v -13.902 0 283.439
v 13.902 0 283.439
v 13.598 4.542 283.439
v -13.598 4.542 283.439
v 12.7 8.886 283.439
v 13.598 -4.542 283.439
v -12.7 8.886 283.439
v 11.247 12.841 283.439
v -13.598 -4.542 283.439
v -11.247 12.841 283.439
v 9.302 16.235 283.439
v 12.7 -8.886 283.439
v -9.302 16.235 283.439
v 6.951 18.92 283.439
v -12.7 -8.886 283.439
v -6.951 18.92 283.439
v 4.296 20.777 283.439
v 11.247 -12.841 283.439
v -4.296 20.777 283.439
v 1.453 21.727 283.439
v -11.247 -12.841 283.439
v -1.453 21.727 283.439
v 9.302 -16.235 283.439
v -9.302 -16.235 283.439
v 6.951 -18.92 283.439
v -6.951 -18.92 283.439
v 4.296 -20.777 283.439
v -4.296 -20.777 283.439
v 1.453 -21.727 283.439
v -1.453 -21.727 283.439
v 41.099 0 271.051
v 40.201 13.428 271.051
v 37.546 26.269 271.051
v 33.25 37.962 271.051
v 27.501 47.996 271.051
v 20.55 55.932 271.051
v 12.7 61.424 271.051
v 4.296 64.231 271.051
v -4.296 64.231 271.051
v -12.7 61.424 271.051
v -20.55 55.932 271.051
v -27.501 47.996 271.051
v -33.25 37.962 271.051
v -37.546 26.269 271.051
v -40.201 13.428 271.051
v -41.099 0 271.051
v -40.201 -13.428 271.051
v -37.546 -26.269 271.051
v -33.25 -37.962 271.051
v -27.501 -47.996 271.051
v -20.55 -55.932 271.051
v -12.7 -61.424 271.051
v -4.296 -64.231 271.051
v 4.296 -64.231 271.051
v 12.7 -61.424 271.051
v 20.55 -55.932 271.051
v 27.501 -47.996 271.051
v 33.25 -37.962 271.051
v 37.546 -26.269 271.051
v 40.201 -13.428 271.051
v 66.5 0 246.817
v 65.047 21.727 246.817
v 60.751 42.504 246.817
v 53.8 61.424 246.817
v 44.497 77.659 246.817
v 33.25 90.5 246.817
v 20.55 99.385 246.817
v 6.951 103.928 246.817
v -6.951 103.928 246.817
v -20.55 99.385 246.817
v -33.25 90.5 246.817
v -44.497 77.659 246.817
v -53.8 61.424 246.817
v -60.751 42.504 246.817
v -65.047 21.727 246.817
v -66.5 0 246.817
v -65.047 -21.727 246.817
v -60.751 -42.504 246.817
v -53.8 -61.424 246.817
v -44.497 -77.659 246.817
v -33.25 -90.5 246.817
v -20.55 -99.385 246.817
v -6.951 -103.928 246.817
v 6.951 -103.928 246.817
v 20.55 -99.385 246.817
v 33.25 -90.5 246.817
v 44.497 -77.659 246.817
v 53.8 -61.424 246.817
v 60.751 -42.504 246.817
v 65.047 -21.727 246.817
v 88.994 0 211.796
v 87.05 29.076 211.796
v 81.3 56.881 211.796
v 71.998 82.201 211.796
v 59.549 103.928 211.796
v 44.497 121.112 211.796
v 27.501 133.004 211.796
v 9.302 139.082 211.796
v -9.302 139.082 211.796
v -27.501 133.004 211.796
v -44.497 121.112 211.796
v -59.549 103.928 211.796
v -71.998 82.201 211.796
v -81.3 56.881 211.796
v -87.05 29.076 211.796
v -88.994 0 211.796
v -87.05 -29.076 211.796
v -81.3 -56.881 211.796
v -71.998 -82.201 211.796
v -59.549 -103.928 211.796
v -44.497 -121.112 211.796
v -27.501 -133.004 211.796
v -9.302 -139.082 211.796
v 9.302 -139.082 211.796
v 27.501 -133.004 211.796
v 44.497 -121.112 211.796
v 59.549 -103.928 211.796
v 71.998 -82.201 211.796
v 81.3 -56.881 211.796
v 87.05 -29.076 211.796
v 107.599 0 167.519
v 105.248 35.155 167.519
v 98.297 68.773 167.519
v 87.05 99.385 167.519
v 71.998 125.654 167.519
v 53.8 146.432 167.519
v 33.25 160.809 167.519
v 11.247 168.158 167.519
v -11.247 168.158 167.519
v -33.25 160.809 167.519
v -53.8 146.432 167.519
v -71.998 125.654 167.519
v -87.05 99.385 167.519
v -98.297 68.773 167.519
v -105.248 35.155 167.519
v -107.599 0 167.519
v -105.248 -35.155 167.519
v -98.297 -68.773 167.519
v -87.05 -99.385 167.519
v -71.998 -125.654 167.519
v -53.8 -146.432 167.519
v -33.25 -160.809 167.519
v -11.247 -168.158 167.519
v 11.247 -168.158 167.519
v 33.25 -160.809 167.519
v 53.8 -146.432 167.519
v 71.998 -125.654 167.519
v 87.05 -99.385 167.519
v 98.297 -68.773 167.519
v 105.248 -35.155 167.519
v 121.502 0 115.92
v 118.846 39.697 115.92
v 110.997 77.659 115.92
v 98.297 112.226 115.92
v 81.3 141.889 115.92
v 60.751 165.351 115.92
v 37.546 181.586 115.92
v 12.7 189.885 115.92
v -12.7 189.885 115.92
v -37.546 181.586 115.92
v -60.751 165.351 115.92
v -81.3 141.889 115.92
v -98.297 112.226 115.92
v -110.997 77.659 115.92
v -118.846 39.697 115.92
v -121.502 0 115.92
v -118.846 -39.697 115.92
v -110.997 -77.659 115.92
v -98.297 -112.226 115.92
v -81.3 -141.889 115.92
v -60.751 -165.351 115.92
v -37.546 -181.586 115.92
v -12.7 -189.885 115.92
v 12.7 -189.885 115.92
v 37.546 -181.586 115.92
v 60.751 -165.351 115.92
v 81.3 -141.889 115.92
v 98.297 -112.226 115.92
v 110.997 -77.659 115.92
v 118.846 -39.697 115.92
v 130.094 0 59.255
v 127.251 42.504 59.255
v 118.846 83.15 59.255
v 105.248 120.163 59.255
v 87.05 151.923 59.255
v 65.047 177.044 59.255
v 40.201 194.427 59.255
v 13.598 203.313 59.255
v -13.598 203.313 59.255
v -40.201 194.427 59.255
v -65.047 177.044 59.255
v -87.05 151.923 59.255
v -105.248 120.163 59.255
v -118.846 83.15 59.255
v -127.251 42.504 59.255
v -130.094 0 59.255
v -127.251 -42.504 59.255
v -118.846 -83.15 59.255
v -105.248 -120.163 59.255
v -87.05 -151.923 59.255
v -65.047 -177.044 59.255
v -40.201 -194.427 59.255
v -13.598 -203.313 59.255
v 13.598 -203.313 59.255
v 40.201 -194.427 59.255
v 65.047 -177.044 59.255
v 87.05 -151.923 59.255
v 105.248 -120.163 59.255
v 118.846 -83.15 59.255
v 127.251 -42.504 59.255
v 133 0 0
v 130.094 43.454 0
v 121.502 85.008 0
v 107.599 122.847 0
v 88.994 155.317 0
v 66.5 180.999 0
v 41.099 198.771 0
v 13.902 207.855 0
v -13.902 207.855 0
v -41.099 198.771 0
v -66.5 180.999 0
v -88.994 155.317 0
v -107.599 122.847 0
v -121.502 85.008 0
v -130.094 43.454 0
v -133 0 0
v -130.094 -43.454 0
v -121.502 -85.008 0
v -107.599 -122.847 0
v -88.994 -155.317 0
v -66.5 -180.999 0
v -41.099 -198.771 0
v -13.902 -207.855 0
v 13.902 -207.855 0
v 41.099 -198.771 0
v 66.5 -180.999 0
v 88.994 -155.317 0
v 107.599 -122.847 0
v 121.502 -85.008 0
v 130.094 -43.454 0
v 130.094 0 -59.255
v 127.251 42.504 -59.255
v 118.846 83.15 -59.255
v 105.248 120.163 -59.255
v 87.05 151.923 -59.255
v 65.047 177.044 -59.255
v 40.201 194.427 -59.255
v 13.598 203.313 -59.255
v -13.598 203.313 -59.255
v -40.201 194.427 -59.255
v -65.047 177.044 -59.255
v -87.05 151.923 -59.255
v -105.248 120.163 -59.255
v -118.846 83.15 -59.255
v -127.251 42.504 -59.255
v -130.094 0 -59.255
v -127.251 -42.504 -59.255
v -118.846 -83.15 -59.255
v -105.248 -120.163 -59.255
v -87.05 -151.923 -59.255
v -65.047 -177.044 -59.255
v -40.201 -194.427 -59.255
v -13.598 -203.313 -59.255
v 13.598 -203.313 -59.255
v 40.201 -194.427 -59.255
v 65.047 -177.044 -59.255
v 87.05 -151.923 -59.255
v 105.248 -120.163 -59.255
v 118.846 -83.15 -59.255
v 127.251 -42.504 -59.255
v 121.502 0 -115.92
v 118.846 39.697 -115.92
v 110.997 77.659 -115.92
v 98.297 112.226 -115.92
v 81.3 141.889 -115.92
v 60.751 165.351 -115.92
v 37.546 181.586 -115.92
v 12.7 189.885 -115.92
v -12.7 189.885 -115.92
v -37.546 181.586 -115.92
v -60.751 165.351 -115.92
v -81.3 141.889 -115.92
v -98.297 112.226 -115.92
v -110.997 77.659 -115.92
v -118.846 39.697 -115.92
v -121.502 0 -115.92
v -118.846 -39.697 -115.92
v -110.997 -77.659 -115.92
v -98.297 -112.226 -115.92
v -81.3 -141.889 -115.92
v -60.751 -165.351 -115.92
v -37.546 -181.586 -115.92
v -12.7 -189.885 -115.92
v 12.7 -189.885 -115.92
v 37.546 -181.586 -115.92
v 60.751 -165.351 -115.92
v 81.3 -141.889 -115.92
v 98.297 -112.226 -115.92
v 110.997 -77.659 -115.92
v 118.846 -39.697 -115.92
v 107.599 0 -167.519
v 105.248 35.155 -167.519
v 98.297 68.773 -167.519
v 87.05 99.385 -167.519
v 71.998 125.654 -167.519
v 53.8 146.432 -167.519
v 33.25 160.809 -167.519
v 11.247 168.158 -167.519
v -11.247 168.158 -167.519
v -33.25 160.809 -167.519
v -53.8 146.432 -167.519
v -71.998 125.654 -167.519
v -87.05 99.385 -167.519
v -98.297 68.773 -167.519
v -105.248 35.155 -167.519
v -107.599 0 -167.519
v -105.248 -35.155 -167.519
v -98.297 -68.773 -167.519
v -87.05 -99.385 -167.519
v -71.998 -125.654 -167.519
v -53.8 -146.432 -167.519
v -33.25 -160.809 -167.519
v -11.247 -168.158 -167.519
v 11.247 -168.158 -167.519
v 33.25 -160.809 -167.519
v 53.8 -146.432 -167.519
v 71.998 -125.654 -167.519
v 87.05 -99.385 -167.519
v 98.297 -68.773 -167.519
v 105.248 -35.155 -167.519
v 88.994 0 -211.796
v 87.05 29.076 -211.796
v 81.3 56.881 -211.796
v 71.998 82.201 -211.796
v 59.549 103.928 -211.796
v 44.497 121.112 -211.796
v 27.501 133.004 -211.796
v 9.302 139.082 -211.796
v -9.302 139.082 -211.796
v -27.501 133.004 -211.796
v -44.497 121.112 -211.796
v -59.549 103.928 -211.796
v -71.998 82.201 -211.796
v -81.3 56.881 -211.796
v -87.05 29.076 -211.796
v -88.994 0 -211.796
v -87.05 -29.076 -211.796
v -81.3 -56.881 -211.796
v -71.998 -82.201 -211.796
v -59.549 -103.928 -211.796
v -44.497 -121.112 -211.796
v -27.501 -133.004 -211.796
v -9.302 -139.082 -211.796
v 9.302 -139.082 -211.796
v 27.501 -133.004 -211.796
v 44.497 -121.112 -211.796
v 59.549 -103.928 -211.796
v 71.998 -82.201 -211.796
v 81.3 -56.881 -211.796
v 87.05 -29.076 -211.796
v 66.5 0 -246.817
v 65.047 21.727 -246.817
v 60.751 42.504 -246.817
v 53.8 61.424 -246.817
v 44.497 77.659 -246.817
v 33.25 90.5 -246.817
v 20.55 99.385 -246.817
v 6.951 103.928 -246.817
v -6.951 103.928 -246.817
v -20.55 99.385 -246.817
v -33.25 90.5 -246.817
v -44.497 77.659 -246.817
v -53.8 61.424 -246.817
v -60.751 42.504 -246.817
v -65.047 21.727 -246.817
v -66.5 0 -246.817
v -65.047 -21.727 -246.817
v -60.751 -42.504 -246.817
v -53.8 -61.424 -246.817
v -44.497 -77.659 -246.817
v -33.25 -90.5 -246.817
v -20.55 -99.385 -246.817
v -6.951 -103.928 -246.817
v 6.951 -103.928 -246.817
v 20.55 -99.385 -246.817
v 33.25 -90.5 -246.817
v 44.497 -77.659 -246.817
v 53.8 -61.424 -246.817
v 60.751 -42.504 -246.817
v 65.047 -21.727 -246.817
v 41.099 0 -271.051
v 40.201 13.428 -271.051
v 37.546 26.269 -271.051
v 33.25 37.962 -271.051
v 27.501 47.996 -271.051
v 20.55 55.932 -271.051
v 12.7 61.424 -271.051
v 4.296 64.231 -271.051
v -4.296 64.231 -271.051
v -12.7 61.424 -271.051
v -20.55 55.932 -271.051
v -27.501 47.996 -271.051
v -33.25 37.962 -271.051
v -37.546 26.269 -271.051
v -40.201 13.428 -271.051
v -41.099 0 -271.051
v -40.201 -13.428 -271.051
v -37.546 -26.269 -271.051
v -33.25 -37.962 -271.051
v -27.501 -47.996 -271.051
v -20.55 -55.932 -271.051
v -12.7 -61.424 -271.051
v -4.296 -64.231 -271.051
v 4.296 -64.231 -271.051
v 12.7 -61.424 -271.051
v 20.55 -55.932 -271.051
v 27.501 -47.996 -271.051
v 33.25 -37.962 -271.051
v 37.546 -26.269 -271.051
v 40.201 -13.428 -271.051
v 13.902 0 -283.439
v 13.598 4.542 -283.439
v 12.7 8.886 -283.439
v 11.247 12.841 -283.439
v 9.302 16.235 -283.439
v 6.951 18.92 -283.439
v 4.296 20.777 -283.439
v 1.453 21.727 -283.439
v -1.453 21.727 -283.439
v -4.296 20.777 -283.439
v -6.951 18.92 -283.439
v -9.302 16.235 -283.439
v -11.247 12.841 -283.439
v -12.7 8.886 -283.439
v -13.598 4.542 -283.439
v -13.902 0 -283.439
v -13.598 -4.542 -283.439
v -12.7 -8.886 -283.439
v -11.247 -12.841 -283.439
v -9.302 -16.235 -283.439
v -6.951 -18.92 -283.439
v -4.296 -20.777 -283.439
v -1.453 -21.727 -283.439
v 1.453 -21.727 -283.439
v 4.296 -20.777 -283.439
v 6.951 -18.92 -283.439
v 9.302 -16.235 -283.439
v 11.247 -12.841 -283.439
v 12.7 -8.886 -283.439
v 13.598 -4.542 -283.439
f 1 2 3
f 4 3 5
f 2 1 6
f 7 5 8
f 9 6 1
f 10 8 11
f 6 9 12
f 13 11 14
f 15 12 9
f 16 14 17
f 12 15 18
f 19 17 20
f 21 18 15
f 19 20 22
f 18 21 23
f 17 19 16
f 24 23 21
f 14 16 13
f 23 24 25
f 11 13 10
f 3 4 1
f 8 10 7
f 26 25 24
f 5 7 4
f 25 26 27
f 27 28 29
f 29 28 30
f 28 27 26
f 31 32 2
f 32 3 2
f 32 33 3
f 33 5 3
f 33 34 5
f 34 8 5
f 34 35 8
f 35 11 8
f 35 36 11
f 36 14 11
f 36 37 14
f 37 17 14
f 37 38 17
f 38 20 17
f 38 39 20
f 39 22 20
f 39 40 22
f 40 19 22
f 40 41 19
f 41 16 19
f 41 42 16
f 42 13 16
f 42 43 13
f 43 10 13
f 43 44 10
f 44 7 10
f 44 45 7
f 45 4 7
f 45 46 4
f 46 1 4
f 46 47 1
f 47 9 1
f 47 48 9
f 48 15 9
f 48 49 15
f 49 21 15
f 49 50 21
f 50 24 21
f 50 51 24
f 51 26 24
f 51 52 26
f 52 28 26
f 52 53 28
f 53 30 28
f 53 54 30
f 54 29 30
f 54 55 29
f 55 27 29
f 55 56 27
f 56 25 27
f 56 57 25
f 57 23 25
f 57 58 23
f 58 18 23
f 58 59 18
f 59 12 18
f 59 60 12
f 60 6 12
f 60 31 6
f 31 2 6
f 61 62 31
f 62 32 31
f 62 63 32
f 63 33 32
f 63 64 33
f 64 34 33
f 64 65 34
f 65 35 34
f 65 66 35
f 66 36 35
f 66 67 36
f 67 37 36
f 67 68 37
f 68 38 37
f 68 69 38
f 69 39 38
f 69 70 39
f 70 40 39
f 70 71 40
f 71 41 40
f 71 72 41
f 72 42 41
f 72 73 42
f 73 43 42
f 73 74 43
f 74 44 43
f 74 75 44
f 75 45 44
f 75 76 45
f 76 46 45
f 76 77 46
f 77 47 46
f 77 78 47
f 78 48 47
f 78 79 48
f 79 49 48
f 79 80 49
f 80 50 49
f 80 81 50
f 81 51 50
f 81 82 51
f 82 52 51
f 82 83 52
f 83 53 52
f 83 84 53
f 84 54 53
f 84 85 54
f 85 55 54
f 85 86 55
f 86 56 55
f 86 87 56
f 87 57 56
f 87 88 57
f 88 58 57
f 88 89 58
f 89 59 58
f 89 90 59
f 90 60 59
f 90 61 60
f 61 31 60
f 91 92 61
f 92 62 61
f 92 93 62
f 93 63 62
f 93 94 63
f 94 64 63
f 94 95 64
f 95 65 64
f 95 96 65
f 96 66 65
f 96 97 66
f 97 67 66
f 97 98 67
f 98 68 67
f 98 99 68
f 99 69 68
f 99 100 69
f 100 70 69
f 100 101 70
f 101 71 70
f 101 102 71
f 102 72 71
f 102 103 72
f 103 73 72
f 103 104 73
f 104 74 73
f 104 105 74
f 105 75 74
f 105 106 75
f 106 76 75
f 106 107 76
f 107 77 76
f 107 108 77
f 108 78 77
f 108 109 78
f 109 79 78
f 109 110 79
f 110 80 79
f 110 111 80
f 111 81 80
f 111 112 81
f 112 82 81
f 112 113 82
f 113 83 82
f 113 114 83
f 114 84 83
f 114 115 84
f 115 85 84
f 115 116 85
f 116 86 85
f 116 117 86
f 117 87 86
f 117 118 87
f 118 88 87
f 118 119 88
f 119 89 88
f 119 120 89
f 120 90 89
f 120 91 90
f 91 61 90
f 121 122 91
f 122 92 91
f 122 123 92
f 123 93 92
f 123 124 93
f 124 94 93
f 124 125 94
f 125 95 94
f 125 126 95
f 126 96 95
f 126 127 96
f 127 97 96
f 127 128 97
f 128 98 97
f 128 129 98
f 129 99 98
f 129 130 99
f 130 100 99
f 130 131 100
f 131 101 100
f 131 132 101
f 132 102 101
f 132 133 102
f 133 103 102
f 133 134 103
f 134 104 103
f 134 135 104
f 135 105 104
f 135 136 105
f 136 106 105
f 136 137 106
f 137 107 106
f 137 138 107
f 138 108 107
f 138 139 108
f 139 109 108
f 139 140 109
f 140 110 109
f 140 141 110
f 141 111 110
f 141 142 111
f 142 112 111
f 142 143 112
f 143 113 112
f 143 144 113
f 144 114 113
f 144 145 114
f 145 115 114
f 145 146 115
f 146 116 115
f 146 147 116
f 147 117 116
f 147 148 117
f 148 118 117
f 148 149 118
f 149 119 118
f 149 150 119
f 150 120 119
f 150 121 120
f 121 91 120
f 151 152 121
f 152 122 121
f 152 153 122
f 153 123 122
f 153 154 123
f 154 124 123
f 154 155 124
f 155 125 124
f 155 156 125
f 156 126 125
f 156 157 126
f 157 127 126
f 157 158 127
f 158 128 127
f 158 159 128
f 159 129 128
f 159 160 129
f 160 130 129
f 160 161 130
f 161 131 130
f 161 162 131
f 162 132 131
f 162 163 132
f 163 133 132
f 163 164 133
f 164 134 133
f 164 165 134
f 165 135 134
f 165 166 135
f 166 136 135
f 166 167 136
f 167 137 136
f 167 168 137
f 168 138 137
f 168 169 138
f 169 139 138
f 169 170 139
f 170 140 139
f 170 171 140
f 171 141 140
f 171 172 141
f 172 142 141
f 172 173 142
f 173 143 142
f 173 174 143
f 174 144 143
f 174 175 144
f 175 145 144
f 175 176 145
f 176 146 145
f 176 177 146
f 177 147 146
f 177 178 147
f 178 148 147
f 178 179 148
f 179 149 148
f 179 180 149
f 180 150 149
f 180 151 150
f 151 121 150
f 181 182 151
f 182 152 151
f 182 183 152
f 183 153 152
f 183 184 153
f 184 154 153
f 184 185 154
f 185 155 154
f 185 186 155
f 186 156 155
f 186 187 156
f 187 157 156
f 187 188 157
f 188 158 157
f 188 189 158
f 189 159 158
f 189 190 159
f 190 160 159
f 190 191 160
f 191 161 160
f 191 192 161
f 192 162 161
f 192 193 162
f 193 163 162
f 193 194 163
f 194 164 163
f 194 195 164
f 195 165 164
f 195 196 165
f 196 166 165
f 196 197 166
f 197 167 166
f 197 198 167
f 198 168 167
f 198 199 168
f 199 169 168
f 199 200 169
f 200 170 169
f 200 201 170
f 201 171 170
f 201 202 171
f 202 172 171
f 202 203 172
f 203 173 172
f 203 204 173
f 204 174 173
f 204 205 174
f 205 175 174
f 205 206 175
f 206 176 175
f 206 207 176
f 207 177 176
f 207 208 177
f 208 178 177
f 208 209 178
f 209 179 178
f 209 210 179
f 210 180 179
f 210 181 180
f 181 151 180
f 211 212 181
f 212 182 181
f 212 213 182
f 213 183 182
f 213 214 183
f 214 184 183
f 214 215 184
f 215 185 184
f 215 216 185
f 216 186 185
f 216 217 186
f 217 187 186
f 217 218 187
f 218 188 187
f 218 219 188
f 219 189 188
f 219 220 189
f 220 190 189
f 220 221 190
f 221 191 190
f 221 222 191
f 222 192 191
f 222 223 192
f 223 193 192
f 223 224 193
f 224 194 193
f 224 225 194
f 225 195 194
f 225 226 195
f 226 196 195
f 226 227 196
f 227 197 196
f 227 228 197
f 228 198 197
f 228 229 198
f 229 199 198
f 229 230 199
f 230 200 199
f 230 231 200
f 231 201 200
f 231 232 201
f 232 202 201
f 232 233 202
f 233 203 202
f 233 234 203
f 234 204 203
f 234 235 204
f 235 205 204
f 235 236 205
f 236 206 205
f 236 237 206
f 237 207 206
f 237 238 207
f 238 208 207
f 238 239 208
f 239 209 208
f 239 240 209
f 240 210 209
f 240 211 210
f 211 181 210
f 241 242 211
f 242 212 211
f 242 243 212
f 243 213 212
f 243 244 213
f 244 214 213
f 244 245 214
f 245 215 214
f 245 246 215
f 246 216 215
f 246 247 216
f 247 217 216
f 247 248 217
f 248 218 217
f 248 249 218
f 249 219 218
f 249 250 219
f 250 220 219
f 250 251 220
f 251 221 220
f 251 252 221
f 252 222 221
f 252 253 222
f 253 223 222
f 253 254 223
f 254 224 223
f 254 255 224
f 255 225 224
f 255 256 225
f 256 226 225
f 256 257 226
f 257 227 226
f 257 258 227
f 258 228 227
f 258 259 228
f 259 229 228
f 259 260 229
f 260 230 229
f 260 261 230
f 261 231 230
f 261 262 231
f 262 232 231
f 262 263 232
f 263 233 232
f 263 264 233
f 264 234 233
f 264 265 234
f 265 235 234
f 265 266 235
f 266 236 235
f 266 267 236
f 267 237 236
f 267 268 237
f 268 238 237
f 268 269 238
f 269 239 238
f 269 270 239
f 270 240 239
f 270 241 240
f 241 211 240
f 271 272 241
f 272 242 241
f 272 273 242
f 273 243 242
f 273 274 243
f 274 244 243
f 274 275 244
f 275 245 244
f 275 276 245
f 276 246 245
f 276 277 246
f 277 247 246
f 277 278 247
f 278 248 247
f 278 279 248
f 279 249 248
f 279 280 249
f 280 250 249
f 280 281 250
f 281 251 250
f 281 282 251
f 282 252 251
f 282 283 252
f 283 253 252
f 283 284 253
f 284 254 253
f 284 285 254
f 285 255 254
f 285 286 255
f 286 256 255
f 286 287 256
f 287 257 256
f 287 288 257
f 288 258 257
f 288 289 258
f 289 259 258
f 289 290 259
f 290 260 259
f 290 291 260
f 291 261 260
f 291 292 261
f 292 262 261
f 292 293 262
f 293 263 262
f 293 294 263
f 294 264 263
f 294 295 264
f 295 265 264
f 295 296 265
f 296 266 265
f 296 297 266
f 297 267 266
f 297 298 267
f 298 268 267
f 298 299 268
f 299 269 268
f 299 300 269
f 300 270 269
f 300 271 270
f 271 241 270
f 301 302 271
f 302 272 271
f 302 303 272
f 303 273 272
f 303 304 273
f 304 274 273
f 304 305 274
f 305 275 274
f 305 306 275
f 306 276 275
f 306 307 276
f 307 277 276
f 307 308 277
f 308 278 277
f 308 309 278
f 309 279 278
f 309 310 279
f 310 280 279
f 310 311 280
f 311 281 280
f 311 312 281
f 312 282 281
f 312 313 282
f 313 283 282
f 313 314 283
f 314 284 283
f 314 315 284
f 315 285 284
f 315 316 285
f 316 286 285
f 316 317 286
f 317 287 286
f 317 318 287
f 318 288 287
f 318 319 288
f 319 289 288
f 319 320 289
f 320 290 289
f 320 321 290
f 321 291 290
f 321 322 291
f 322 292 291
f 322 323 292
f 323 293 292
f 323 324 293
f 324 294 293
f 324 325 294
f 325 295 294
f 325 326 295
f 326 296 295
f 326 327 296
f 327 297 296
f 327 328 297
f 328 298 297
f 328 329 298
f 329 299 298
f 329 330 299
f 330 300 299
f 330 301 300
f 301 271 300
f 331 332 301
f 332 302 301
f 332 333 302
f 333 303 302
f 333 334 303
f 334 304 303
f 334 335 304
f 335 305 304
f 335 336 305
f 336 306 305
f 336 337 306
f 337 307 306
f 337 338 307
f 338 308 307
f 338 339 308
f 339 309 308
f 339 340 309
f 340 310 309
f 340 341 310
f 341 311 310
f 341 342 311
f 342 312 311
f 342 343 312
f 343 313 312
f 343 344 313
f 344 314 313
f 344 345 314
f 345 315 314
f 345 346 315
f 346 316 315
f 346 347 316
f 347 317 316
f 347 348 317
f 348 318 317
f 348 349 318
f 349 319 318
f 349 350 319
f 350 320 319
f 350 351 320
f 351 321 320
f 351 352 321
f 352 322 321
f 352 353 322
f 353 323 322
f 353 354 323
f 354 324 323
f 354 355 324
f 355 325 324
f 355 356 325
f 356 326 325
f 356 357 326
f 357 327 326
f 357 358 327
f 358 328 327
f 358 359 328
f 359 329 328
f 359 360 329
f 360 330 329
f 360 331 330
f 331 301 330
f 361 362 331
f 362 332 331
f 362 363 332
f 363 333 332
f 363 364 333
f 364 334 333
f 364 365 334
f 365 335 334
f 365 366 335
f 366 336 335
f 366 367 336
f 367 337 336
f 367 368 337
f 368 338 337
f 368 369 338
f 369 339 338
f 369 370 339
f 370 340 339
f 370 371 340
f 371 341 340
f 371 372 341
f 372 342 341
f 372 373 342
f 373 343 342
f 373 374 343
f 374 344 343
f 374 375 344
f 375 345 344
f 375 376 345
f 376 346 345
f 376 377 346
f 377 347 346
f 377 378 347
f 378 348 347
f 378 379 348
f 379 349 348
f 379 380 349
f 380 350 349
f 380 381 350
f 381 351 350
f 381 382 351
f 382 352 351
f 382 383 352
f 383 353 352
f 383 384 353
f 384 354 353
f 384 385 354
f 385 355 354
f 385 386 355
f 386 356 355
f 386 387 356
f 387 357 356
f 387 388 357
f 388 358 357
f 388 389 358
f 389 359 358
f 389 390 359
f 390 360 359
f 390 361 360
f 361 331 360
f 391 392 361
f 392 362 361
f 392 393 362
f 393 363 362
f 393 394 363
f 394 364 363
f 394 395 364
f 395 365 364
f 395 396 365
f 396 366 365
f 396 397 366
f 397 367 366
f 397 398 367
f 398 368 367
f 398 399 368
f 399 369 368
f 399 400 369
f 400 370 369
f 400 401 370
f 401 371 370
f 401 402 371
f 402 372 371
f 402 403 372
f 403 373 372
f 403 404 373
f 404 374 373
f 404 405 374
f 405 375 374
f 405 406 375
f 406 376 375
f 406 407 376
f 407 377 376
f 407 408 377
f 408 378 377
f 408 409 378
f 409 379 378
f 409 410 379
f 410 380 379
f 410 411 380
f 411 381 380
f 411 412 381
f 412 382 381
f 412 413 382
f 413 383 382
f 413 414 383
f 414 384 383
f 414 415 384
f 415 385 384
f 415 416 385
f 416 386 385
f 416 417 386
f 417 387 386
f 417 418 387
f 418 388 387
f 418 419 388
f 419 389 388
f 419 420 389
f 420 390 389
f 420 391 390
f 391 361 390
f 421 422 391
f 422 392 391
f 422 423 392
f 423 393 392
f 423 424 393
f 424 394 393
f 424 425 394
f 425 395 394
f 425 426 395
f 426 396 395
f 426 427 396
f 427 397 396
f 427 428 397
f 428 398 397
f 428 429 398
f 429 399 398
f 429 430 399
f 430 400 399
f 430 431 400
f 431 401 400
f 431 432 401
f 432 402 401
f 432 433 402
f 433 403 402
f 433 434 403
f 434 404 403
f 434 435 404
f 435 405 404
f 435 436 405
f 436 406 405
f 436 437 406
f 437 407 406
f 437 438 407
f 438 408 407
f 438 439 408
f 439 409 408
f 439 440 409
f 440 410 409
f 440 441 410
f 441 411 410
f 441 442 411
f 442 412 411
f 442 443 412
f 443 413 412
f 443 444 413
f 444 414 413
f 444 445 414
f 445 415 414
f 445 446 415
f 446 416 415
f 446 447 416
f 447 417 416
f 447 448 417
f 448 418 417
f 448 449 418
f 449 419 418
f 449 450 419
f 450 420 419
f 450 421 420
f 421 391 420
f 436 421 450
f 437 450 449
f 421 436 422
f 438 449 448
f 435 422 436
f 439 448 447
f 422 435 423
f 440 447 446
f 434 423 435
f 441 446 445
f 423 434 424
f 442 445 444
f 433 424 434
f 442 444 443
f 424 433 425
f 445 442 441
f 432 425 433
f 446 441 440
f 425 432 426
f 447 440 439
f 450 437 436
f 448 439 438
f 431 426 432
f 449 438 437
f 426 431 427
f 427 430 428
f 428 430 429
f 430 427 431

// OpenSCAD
// Generated by SolidPython 1.0.1 on 2020-07-29 00:39:26


scale(v = [7, 11, 15]) {
	sphere(r = 19);
}
/***********************************************
*********      SolidPython code:      **********
************************************************
 
# import packages: SolidPython
from solid import *
from solid.utils import *
from itertools import chain, combinations


class Resize:

    def __init__(self, scad_file):
        self.scad_file = scad_file
        #self.scad_file = import_scad(scad_file)
        # cone/cylinder param:
        self.r1 = 0
        self.r2 = 0
        self.h = 0
        # rectangular prism param:
        self.w = 0
        self.l = 0
        # ellipse param:
        self.r = 0

    # import OpenScad code (file name corresponds to shape)


    # classify shape + parameters
    def assign(self, param1, param2, param3):
        if self.scad_file == 'cone.scad':
            self.r1 = param1
            self.r2 = param2
            self.h = param3
        elif self.scad_file == 'cylinder.scad':
            self.r1 = param1
            self.r2 = param2
            self.h = param3
        elif self.scad_file == 'rectangularPrism.scad':
            self.h = param1
            self.l = param2
            self.w = param3
        else:
            self.r = param1
            self.h = param2

    # resize parameters
    def iterate(self):
        x = range(3, 20, 2)
        i = 1
        if self.scad_file == 'cone.scad':
            tempList = list(combinations(x, 2))
            for temp in tempList:
                param1 = temp[0]
                param2 = temp[1]
                filepath = 'produced_scad_files/' + 'cone' + str(param1) + '_' + str(param2) + '_' + '.scad'
                scad_render_to_file(cylinder(h=param1, r1=param2, r2=0), filepath)

        elif self.scad_file == 'cylinder.scad':
            tempList = list(combinations(x, 3))
            for temp in tempList:
                param1 = temp[0]
                param2 = temp[1]
                filepath = 'produced_scad_files/' + 'cylinder' + str(param1) + '_' + str(param2) + '_' + '.scad'
                scad_render_to_file(cylinder(h=param1, r1=param2, r2=param2), filepath)

        elif self.scad_file == 'rectangularPrism.scad':
            tempList = list(combinations(x, 3))
            for temp in tempList:
                param1 = temp[0]
                param2 = temp[1]
                param3 = temp[2]
                filepath = 'produced_scad_files/' + 'rectangularPrism' + str(param1) + '_' + str(param2) + '_' + str(
                    param3) + '.scad'
                scad_render_to_file(cube(size=(param1, param2, param3)), filepath)

        elif self.scad_file == 'ellipse.scad':
            tempList = list(combinations(x, 4))
            for temp in tempList:
                param1 = temp[0]
                param2 = temp[1]
                param3 = temp[2]
                param4 = temp[3]
                filepath = 'produced_scad_files/' + 'ellipse' + str(param1) + '_' + str(param2) + '_' + str(param3) + '_' + str(param4) + '.scad'
                scad_render_to_file(scale([param1, param2, param3])(sphere(r=param4)), filepath)

    def render_to_scadfile(self):
        scad_render_to_file(scad, 'example.scad') 
 
************************************************/
